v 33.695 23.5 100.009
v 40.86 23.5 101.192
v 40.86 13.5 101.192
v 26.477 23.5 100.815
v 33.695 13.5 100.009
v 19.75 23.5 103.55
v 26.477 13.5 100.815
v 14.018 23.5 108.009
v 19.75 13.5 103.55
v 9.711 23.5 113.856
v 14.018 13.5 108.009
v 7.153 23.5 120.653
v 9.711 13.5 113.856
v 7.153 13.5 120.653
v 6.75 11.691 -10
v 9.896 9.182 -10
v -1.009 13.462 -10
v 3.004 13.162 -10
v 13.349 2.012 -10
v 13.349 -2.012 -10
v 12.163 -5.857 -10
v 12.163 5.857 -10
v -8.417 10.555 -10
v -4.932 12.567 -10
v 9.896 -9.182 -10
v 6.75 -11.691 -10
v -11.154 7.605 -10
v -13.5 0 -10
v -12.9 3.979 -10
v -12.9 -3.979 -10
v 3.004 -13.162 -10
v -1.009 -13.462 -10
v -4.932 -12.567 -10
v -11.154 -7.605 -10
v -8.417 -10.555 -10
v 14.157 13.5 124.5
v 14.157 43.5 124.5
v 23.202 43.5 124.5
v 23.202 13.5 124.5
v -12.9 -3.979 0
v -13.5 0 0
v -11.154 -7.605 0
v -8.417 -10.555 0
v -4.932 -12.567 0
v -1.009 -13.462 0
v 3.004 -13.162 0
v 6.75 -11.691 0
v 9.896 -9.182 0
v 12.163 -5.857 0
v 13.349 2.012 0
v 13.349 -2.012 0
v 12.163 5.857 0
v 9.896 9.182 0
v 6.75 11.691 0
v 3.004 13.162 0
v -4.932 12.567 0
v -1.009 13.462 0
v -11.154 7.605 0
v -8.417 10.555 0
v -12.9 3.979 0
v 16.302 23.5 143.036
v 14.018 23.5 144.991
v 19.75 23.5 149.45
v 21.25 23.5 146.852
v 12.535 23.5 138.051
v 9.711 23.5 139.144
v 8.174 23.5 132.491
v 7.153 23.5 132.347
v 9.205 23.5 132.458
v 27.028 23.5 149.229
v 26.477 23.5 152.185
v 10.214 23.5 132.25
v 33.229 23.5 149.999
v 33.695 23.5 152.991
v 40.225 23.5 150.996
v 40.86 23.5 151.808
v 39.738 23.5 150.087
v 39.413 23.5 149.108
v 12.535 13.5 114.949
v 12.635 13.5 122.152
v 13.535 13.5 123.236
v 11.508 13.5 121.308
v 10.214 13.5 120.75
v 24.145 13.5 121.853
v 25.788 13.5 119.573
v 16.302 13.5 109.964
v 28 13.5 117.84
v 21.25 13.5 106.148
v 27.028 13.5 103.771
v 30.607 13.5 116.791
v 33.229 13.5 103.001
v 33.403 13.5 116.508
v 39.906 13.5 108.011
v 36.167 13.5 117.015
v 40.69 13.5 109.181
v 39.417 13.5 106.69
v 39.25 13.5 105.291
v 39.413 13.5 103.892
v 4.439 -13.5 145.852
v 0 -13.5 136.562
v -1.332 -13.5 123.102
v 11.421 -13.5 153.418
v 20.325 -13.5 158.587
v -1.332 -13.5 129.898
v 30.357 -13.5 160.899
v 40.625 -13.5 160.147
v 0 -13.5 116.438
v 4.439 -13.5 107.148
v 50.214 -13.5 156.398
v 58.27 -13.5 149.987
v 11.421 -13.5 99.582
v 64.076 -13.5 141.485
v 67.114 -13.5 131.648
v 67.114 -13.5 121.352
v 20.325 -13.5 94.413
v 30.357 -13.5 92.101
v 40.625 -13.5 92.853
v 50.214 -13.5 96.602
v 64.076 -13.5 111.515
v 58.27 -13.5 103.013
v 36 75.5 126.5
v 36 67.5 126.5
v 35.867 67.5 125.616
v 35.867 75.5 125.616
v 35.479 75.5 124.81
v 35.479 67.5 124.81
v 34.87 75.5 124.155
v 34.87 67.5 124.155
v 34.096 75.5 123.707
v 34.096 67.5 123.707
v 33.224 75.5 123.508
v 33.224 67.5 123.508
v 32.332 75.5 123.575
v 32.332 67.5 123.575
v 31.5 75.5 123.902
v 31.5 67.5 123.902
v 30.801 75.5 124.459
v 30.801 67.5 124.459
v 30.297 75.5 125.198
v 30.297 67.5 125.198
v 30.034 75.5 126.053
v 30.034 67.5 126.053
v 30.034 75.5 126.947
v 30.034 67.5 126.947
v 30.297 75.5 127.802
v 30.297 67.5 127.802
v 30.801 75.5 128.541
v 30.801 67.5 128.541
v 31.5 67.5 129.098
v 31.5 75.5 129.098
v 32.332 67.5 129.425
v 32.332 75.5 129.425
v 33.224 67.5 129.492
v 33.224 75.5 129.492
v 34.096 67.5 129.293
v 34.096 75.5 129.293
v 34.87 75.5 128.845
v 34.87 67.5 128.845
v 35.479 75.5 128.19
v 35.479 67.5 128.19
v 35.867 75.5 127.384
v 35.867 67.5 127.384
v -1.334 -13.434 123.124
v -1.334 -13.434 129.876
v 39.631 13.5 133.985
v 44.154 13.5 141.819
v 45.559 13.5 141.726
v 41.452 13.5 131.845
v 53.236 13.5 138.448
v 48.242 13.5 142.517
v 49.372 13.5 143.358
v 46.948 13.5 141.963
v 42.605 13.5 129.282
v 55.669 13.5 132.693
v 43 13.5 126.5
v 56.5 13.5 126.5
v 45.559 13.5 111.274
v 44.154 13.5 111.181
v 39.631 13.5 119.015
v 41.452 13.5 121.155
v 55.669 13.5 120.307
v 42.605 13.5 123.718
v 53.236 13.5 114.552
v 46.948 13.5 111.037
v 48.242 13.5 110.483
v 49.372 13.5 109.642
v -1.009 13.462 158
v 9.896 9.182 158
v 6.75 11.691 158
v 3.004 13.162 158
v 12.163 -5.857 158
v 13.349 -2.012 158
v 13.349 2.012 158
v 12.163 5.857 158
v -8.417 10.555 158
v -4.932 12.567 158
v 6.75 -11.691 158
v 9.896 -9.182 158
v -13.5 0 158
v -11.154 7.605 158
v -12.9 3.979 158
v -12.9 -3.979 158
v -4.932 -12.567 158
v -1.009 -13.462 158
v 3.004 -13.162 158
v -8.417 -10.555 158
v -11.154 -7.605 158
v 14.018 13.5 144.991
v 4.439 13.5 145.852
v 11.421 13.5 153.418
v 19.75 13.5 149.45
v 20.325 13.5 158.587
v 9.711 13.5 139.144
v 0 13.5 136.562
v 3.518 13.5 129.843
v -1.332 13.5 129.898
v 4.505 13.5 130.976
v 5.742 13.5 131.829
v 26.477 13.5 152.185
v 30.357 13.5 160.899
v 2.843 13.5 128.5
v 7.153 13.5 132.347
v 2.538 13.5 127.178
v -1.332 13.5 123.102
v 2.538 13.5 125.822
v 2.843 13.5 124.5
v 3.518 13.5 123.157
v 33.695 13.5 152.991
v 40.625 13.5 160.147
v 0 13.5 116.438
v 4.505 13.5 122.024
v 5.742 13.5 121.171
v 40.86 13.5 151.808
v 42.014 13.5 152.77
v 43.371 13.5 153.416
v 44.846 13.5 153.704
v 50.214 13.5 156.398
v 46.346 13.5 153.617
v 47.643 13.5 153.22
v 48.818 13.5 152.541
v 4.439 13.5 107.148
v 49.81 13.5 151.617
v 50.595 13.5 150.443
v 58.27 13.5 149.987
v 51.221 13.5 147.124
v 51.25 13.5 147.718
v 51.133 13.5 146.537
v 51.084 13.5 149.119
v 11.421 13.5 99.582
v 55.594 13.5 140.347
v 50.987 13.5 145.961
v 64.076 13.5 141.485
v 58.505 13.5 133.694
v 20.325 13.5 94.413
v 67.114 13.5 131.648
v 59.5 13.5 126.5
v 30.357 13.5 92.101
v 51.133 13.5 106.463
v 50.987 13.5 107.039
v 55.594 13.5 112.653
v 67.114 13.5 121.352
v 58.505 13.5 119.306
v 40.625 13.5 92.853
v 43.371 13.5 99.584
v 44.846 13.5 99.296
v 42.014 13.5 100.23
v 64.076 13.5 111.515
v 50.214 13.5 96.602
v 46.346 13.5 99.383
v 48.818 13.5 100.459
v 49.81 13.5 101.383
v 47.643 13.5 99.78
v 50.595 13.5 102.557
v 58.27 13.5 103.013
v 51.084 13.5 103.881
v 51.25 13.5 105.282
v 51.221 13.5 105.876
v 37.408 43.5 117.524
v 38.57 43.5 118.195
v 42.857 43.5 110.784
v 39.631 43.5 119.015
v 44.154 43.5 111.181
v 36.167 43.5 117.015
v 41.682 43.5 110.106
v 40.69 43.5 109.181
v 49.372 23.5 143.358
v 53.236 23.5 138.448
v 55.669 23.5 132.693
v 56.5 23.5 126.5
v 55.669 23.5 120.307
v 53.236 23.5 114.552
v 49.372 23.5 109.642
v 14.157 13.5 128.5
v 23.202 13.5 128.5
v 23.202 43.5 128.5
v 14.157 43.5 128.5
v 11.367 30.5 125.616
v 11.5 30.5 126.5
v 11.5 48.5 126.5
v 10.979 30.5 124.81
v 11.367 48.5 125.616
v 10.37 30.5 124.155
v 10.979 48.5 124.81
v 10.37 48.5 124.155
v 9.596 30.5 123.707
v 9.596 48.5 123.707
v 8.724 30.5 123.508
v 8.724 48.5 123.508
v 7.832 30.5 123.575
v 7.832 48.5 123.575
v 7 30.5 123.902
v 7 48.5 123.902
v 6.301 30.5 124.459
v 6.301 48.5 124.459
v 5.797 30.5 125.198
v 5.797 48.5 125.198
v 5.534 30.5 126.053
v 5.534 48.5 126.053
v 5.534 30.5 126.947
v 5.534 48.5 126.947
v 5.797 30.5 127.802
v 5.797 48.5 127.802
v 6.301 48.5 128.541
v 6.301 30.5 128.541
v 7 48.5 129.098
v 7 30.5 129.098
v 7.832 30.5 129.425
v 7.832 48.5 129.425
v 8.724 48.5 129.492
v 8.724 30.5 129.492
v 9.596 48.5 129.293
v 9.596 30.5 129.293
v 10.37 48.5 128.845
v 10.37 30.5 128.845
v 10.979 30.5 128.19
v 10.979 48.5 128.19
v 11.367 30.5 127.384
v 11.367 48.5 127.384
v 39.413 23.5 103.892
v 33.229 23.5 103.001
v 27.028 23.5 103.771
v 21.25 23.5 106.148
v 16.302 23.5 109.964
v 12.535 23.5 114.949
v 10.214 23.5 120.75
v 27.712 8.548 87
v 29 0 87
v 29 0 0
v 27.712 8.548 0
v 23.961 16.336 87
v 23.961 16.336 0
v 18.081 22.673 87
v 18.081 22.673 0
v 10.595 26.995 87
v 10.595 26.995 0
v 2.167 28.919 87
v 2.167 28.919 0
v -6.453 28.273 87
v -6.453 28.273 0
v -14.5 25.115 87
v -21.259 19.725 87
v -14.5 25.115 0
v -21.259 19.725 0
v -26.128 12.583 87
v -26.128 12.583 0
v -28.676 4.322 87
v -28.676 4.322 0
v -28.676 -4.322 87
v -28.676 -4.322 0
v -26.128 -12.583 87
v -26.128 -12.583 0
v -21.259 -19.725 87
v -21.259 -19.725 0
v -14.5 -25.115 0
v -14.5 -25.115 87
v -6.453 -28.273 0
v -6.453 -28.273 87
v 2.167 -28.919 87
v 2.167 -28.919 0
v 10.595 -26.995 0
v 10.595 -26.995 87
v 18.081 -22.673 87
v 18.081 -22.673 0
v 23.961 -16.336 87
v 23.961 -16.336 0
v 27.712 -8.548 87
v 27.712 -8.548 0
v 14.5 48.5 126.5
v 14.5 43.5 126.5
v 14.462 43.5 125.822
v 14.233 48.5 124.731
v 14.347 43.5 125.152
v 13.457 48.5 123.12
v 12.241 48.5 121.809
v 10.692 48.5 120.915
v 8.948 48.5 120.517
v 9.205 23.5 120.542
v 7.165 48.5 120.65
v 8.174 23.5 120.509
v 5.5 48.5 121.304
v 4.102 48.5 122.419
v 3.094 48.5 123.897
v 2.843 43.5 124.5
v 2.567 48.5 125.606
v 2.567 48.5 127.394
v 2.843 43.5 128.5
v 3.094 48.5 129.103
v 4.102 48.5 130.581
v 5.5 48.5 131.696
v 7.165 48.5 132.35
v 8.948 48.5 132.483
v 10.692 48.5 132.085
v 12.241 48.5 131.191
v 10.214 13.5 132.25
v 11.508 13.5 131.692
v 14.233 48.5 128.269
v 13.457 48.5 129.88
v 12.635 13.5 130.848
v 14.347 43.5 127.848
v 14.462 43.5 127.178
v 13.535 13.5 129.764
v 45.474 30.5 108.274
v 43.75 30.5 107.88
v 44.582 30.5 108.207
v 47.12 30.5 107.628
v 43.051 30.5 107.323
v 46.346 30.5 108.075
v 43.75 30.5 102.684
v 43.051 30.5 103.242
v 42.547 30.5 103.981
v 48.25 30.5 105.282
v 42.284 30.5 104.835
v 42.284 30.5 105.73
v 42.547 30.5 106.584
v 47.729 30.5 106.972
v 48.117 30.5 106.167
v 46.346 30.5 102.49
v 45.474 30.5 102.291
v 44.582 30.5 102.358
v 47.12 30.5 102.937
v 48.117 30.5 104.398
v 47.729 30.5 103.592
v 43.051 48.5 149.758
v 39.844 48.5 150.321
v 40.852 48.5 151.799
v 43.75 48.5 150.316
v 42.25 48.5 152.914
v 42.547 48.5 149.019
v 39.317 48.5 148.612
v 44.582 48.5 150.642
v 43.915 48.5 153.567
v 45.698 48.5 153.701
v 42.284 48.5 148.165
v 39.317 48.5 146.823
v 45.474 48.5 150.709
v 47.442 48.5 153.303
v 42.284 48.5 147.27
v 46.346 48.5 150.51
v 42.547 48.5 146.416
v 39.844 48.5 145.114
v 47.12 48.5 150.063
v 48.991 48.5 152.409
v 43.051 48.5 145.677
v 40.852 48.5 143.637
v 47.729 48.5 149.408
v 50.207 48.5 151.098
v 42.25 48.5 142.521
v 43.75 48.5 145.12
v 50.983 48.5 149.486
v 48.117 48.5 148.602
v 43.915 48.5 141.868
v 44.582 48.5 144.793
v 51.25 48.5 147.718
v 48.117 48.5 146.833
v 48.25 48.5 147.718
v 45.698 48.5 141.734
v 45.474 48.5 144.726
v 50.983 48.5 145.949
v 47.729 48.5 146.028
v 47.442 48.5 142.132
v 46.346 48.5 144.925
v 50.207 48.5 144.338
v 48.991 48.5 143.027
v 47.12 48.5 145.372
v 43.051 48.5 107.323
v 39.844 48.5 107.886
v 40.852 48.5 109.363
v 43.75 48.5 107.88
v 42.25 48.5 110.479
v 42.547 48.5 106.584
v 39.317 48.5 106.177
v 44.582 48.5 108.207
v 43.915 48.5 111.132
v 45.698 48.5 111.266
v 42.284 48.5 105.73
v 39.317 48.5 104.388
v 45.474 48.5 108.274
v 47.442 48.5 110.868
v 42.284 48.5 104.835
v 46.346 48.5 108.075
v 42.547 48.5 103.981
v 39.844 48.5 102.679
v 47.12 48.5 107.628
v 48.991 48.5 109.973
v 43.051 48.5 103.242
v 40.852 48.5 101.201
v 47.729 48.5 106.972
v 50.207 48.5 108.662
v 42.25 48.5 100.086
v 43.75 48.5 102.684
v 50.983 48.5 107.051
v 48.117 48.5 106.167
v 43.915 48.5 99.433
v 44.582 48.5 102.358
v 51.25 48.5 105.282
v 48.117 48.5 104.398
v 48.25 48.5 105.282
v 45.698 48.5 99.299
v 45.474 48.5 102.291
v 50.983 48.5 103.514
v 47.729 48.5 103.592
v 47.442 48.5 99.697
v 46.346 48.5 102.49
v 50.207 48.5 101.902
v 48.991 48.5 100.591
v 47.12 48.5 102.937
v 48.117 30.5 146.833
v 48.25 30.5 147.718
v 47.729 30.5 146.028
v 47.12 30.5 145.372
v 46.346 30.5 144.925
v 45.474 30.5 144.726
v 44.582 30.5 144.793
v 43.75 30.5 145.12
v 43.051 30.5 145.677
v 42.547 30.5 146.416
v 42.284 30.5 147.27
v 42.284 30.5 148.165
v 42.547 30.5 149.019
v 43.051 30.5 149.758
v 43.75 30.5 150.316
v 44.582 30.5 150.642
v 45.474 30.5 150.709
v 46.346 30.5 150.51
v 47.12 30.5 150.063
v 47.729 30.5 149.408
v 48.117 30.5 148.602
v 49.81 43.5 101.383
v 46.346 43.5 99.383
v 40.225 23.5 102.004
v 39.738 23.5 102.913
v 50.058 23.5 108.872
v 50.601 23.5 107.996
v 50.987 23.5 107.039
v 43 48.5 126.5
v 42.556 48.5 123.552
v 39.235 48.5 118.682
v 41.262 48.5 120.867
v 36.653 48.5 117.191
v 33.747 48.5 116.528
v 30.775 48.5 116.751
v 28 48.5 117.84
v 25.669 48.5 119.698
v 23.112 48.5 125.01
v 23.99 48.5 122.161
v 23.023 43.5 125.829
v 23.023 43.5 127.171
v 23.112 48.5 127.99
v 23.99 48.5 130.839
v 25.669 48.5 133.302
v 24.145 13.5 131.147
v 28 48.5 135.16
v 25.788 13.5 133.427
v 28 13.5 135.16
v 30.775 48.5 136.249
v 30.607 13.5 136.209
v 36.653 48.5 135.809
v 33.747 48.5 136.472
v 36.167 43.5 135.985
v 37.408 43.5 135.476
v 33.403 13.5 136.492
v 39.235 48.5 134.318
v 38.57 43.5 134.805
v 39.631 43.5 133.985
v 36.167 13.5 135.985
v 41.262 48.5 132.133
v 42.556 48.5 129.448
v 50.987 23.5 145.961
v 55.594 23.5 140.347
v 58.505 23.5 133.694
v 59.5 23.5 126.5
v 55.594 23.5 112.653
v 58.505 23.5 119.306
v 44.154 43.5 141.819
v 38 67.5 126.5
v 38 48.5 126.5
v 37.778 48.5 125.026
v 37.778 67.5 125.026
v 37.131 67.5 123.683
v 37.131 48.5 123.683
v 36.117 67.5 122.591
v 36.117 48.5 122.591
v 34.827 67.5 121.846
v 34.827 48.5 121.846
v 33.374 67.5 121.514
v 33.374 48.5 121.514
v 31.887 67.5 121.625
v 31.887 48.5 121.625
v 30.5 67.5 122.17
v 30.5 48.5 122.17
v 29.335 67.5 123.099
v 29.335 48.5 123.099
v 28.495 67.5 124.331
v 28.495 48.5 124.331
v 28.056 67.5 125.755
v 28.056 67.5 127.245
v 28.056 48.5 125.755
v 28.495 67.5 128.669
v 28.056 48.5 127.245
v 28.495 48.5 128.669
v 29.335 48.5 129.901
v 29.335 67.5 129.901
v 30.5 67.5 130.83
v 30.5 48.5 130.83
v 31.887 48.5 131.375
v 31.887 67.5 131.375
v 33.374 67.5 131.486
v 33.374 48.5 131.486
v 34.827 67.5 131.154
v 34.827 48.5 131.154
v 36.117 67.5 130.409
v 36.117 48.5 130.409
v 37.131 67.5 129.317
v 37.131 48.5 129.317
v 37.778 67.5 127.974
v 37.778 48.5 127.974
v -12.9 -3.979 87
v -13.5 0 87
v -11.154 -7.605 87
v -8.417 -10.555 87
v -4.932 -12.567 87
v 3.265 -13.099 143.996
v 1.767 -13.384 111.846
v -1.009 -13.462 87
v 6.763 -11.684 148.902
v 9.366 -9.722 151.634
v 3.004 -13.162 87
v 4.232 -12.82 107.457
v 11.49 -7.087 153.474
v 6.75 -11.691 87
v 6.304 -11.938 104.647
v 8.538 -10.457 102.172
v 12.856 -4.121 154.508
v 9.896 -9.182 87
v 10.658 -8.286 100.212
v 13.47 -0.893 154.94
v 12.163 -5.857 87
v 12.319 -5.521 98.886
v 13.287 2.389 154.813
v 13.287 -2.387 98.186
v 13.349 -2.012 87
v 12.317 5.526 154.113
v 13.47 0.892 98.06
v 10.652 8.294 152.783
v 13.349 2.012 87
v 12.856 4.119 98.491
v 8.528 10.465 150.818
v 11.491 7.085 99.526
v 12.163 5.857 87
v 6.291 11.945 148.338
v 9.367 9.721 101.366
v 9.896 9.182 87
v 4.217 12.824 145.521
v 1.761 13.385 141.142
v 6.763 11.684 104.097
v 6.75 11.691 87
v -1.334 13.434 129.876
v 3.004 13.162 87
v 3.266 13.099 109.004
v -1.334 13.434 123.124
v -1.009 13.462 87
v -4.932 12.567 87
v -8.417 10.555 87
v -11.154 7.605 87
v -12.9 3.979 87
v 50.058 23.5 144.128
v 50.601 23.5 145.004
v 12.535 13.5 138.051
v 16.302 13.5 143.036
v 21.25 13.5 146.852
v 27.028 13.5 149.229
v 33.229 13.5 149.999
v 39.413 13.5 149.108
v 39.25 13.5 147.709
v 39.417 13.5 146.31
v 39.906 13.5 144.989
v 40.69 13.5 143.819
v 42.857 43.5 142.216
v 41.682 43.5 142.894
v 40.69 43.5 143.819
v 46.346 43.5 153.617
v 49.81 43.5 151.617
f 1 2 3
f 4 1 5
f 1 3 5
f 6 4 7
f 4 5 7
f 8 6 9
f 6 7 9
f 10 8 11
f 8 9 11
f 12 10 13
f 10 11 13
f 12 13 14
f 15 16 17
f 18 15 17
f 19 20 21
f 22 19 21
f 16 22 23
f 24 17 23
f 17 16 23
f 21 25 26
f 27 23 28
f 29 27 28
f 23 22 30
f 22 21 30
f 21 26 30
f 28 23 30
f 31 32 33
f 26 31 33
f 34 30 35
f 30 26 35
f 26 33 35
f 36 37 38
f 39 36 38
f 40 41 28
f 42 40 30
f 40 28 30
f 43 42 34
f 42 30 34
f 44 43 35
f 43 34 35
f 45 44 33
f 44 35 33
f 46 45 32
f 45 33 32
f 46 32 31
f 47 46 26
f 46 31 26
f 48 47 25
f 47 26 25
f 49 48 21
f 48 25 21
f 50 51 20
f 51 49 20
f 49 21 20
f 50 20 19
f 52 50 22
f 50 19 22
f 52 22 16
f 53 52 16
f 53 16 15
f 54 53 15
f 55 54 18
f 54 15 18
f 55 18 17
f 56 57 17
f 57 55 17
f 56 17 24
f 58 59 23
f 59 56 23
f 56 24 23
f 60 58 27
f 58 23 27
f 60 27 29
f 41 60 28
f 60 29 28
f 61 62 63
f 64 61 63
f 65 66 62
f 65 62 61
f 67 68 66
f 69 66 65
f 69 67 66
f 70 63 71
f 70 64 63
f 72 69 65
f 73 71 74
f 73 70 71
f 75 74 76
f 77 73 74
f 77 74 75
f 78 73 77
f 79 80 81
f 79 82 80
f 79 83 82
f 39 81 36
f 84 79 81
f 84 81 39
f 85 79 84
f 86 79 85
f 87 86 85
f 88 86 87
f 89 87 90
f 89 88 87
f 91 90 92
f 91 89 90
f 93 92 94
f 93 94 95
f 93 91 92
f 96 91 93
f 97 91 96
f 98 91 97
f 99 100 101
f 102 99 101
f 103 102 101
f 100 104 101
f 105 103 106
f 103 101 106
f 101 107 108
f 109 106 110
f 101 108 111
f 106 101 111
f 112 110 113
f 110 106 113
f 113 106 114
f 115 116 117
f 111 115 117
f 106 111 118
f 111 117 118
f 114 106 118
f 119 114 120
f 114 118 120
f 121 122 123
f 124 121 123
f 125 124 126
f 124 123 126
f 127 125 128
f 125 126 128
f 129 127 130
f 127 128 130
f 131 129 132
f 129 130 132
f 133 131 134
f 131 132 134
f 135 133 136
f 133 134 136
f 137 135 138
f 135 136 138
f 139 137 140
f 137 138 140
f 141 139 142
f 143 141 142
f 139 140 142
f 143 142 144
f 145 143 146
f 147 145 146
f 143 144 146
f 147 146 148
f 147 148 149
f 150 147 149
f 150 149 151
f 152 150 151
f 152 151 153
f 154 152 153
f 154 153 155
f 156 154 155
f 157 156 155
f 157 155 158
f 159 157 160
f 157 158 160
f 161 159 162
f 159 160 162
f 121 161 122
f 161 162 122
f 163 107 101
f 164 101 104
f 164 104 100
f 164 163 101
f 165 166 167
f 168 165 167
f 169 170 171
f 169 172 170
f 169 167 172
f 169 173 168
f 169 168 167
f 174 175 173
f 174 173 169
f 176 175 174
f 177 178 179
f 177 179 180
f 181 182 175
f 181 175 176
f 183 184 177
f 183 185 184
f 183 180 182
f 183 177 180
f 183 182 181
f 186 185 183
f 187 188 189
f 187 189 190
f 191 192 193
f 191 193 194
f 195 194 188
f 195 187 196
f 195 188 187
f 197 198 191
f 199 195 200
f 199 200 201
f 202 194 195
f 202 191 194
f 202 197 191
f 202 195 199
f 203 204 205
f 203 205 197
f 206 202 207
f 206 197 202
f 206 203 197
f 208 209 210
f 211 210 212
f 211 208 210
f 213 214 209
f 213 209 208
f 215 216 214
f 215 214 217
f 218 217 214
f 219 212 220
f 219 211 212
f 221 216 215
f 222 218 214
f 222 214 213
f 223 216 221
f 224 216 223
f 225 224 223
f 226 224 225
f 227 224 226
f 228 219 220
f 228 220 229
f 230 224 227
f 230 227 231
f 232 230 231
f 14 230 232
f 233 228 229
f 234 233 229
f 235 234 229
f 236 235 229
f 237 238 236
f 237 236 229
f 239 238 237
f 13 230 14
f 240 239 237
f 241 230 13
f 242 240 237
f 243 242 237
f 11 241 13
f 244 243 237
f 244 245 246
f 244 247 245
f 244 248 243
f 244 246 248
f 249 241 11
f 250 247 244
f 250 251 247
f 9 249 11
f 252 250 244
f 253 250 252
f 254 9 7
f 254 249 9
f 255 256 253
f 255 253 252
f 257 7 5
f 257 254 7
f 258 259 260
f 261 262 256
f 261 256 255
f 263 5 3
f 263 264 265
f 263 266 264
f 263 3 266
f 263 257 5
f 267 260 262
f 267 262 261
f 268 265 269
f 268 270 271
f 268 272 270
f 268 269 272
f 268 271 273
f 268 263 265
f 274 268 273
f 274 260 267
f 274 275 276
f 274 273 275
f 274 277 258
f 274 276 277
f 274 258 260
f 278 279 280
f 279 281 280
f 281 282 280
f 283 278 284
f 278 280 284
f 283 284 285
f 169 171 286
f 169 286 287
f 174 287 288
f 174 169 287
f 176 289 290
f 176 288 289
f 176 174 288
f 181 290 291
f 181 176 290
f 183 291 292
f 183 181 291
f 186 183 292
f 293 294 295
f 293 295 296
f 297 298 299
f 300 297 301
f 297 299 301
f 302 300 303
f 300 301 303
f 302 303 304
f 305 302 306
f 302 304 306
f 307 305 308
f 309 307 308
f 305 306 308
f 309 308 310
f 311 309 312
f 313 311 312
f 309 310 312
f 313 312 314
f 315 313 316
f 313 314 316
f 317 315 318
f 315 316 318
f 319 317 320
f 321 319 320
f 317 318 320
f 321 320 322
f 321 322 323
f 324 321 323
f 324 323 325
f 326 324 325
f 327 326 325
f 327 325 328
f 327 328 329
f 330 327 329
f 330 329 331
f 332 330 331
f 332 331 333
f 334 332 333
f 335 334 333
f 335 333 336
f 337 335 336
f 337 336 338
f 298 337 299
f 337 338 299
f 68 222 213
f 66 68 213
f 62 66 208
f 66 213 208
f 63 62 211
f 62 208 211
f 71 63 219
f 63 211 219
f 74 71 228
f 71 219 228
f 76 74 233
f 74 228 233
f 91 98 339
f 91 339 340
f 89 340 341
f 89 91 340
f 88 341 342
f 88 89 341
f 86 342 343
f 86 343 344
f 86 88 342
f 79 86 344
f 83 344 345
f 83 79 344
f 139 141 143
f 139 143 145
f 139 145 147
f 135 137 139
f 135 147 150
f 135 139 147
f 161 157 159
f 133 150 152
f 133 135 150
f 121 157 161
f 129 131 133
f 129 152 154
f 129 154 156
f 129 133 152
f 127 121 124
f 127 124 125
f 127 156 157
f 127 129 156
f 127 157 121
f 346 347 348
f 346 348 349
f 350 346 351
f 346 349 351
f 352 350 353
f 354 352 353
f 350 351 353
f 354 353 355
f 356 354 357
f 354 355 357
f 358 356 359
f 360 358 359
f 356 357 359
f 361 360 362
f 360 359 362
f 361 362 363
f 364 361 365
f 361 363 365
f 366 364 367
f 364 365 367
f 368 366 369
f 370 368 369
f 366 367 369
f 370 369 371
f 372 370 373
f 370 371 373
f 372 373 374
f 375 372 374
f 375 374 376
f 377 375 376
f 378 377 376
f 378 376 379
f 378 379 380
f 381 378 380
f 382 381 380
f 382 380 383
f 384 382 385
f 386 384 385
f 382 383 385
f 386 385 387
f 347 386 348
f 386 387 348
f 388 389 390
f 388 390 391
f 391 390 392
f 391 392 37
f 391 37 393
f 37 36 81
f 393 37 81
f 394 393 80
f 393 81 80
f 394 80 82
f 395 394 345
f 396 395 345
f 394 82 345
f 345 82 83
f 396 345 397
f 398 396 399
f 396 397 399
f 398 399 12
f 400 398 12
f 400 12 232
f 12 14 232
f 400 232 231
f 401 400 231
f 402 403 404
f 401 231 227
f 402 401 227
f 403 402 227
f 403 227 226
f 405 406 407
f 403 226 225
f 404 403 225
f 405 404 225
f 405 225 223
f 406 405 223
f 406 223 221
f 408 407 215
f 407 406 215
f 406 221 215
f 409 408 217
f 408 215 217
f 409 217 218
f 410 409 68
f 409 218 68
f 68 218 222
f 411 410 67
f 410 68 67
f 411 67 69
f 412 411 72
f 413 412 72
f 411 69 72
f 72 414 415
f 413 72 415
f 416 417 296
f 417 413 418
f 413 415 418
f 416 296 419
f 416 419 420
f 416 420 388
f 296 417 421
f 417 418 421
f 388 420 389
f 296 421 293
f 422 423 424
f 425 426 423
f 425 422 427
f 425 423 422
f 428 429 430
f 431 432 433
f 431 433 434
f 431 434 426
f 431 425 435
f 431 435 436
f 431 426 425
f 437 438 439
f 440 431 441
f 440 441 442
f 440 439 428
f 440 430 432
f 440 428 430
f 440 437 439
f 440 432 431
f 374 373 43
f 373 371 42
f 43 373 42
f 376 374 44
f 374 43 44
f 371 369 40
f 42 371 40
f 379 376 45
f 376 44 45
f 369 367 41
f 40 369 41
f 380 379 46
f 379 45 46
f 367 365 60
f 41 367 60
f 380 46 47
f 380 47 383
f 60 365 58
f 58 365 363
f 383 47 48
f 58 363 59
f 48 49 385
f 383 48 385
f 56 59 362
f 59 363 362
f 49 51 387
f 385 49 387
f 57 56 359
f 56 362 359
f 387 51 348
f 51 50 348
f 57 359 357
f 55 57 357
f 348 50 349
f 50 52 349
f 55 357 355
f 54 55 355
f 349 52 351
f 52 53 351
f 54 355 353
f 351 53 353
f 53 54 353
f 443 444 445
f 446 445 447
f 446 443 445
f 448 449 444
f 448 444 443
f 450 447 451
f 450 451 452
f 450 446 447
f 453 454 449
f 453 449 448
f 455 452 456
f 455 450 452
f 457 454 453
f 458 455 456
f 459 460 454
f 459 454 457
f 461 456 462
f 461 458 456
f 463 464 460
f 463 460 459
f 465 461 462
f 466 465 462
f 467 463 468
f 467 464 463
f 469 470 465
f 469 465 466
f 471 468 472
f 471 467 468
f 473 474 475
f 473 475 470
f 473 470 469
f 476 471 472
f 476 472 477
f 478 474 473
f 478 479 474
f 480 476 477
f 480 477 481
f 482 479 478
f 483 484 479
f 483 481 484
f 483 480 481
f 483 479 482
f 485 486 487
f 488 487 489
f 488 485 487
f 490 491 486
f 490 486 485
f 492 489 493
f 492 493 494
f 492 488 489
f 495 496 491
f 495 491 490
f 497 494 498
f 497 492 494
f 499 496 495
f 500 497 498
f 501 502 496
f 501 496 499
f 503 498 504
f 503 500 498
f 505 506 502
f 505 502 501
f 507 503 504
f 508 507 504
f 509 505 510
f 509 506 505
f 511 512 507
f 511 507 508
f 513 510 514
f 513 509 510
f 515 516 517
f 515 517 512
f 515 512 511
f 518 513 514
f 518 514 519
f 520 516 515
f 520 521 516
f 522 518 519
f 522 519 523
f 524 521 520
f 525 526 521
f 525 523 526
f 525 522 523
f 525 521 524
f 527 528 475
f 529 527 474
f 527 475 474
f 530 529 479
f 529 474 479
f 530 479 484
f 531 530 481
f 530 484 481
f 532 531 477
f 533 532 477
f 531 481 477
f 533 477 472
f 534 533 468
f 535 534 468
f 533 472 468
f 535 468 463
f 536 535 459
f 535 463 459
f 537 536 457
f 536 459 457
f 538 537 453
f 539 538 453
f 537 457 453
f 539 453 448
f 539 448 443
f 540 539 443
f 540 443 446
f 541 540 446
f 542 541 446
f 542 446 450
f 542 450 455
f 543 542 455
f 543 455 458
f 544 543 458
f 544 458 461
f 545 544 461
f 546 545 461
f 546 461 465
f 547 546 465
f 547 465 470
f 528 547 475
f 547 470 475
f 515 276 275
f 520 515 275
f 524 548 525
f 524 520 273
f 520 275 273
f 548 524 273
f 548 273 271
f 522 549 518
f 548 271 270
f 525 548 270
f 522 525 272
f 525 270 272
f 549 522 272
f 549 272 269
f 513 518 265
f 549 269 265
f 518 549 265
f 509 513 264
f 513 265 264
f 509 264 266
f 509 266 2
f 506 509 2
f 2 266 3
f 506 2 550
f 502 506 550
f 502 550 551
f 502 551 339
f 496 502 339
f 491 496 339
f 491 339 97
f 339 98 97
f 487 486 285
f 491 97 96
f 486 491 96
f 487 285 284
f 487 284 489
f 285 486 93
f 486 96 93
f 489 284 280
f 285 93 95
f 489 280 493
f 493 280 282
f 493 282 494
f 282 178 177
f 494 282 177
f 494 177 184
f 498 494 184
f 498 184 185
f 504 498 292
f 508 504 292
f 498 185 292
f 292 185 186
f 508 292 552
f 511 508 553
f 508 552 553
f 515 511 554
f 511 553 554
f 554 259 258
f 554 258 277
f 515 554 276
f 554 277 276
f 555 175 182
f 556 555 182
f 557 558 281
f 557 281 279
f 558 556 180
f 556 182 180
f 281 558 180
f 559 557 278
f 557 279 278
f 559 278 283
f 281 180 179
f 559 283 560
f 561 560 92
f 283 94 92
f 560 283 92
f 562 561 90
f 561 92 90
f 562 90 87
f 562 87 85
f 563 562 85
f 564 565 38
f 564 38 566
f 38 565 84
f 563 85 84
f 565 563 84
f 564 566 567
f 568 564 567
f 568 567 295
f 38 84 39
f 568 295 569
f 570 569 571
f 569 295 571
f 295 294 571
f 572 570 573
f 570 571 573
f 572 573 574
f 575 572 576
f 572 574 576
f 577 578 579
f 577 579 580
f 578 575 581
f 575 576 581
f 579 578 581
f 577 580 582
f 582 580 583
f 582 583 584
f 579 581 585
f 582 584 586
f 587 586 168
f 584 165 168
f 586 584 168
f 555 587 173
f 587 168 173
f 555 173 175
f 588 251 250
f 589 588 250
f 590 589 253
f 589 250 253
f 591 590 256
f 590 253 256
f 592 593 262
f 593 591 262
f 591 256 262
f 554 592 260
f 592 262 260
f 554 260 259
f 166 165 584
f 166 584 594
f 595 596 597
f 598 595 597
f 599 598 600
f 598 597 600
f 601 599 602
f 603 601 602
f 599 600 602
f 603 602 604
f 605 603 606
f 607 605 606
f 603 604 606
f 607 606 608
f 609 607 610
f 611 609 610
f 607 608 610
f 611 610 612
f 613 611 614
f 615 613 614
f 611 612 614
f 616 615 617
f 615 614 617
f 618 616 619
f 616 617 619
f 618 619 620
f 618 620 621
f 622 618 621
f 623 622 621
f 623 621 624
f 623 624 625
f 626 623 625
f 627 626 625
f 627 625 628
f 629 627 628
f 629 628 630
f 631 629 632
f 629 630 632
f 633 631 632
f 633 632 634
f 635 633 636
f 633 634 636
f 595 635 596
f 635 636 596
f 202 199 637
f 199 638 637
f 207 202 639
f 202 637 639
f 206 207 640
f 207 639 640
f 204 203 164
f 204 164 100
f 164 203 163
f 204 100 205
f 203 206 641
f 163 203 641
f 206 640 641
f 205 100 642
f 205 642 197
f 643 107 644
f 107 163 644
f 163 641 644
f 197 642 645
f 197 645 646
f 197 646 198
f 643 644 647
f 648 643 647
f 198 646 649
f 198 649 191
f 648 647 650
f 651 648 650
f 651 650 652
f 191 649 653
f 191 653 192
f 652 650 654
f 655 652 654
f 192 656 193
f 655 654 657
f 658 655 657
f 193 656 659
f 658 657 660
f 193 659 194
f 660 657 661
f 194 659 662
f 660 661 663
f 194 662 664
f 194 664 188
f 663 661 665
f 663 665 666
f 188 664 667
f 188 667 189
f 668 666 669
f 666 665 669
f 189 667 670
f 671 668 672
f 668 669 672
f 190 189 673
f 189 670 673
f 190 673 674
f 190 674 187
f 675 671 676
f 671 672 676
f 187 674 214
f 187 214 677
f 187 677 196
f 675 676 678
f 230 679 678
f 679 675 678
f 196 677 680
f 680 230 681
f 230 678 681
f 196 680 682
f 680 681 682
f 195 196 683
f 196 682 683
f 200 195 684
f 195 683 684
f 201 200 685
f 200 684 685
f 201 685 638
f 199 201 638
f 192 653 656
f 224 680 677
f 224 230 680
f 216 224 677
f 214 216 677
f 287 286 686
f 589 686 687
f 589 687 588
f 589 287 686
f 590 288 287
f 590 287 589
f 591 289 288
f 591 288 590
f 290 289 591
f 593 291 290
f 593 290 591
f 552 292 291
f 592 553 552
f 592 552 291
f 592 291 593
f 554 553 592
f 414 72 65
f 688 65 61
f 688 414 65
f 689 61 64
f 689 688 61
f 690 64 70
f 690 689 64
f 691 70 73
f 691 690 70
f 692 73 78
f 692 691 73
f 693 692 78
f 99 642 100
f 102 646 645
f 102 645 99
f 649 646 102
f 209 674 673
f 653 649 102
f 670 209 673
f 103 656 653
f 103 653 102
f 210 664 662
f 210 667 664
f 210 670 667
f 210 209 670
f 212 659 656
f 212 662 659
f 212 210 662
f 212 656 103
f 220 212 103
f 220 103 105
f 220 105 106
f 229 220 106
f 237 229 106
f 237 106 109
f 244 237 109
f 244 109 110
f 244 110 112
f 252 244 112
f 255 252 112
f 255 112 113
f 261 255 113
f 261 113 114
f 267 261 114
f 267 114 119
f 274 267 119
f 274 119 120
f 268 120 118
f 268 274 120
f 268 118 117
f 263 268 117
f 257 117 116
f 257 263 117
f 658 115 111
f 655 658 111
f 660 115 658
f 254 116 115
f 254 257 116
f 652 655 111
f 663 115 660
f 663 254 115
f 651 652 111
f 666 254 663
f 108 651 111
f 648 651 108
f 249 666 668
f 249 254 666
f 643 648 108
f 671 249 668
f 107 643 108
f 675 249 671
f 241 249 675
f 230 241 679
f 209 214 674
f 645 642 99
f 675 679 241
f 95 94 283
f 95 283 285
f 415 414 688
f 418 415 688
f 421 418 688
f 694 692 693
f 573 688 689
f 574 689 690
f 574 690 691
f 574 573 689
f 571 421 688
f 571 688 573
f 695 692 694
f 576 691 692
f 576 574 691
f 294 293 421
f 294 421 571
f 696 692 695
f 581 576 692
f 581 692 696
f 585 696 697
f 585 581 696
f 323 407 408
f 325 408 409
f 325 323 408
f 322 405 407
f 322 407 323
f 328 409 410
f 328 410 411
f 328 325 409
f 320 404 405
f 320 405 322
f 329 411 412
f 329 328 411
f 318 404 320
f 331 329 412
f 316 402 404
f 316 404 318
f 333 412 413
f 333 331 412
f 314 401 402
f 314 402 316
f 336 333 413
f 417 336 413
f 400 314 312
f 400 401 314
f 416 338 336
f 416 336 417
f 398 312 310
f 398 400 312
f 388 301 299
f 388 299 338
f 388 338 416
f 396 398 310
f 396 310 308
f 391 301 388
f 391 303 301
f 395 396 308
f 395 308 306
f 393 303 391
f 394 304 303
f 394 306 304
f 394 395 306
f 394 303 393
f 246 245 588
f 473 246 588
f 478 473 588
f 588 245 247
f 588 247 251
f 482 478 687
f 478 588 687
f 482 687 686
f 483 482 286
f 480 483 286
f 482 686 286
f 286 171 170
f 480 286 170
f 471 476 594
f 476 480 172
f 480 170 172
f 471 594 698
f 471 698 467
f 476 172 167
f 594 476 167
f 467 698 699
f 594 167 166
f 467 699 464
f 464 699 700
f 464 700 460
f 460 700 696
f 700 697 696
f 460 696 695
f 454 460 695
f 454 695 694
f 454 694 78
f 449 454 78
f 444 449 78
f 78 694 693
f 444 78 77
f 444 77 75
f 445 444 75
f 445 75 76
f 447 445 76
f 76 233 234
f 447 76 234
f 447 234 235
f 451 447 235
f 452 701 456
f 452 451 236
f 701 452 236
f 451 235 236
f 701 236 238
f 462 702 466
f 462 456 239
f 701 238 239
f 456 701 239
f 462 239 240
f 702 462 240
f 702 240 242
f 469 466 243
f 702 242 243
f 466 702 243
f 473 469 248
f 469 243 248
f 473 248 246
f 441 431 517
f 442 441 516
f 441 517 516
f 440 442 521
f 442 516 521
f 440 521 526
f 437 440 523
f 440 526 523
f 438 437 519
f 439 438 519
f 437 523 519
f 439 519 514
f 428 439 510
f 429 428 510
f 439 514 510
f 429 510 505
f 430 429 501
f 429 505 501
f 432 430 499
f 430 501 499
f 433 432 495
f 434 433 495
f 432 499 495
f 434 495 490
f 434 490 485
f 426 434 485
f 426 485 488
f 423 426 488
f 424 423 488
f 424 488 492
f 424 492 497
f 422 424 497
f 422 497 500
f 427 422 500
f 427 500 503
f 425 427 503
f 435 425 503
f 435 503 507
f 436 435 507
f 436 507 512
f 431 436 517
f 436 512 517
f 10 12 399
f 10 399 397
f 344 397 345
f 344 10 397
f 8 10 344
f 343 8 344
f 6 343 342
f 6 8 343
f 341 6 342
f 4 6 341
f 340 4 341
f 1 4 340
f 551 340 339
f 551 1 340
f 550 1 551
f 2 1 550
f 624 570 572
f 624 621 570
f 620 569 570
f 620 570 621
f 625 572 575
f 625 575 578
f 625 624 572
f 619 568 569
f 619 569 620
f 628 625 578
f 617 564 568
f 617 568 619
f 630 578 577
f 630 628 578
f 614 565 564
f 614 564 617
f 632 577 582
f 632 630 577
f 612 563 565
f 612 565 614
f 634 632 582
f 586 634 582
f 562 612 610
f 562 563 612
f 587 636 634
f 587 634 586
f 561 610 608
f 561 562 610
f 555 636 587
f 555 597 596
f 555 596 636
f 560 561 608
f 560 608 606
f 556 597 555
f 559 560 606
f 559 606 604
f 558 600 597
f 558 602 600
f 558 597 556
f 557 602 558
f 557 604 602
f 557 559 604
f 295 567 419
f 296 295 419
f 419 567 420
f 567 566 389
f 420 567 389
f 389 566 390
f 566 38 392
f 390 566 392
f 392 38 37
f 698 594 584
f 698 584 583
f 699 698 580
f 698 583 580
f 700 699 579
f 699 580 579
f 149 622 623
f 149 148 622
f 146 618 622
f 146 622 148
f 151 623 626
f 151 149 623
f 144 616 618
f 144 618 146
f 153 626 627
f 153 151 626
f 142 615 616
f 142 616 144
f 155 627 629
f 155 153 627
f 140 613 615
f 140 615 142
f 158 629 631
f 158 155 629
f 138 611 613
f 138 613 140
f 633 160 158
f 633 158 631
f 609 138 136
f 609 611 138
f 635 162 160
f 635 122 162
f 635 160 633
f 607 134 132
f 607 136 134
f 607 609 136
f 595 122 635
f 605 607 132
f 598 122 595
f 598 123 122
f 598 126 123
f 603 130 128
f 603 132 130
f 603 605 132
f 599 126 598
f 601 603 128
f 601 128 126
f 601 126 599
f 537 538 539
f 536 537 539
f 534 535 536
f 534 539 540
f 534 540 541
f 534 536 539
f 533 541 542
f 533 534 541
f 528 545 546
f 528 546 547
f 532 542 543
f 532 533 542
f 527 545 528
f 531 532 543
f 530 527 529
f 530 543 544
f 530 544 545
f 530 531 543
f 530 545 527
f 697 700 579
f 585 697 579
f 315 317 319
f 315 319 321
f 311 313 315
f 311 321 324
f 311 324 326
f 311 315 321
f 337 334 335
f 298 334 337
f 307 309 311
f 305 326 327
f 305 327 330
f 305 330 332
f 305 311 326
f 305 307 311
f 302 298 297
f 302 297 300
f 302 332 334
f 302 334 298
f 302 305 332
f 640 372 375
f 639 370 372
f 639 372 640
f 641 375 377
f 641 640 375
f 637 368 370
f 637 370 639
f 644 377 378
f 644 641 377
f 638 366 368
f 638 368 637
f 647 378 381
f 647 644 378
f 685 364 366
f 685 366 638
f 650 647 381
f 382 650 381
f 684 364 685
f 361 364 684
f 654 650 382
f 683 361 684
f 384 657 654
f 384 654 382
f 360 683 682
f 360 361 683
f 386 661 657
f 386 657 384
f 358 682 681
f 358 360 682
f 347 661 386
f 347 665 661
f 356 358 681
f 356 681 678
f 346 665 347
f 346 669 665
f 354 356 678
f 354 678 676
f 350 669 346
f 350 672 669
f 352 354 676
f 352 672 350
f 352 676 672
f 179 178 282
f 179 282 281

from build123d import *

# Parameters (mm, degrees)
SKETCH1_R           = 29
BOSS_EXTRUDE1_DEPTH = 87
SKETCH3_W           = 13.5
SKETCH3_H           = 168
SKETCH4_R           = 34.5
BOSS_EXTRUDE2_DEPTH = 13.5
SKETCH5_R           = 6
SKETCH5_R_2         = 10
BOSS_EXTRUDE3_DEPTH = 35
BOSS_EXTRUDE4_DEPTH = 30
SKETCH7_R           = 26.5
SKETCH7_R_2         = 23.5
BOSS_EXTRUDE5_DEPTH = 10
SKETCH8_R           = 3
CUT_EXTRUDE1_DEPTH  = 18
SKETCH9_R           = 5
BOSS_EXTRUDE6_DEPTH = 19
SKETCH10_R          = 3
BOSS_EXTRUDE7_DEPTH = 8


with BuildPart() as part:
    # Sketch1 → Boss-Extrude1 (new body)
    with BuildSketch(Plane.XY):
        Circle(SKETCH1_R)
    extrude(amount=BOSS_EXTRUDE1_DEPTH)

    # Sketch3 → Revolve1 (revolve)
    with BuildSketch(Plane(origin=(0, 0, 0), x_dir=(1, 0, 0), z_dir=(0, 1, 0))):
        with Locations((-6.75, -74)):
            Rectangle(SKETCH3_W, SKETCH3_H)
    revolve(axis=Axis((0, 0, 0), (0, 0, 1)))

    # Sketch4 → Boss-Extrude2 (add, symmetric)
    with BuildSketch(Plane(origin=(0, 0, 0), x_dir=(1, 0, 0), z_dir=(0, 1, 0))):
        with Locations((33, -126.5)):
            Circle(SKETCH4_R)
    extrude(amount=BOSS_EXTRUDE2_DEPTH, both=True)

    # Sketch5 → Boss-Extrude3 (add)
    with BuildSketch(Plane(origin=(0, 13.5, 0), x_dir=(1, 0, 0), z_dir=(0, 1, 0))):
        with Locations((8.5, -126.5)):
            Circle(SKETCH5_R)
        with Locations((33, -126.5)):
            Circle(SKETCH5_R_2)
        with Locations((45.25, -105.282377607)):
            Circle(SKETCH5_R)
        with Locations((45.25, -147.717622393)):
            Circle(SKETCH5_R)
    extrude(amount=BOSS_EXTRUDE3_DEPTH)

    # Sketch6 → Boss-Extrude4 (add)
    with BuildSketch(Plane(origin=(0, 13.5, 0), x_dir=(1, 0, 0), z_dir=(0, 1, 0))):
        Polygon((31.845299462, -128.5), (2.843145751, -128.5), (2.843145751, -124.5), (31.845299462, -124.5), (46.346376317, -99.383398122), (49.810477932, -101.383398122), (36.0121545, -125.282795366), (36.116305102, -127.897598768), (49.810477932, -151.616601878), (46.346376317, -153.616601878), align=None)
    extrude(amount=BOSS_EXTRUDE4_DEPTH)

    # Sketch7 → Boss-Extrude5 (add)
    with BuildSketch(Plane(origin=(0, 13.5, 0), x_dir=(1, 0, 0), z_dir=(0, 1, 0))):
        with Locations((33, -126.5)):
            Circle(SKETCH7_R)
        with Locations((33, -126.5)):
            Circle(SKETCH7_R_2, mode=Mode.SUBTRACT)
    extrude(amount=BOSS_EXTRUDE5_DEPTH)

    # Sketch8 → Cut-Extrude1 (cut)
    with BuildSketch(Plane(origin=(0, 48.5, 0), x_dir=(1, 0, 0), z_dir=(0, 1, 0))):
        with Locations((8.5, -126.5)):
            Circle(SKETCH8_R)
        with Locations((45.25, -105.282377607)):
            Circle(SKETCH8_R)
        with Locations((45.25, -147.717622393)):
            Circle(SKETCH8_R)
    extrude(amount=-CUT_EXTRUDE1_DEPTH, mode=Mode.SUBTRACT)

    # Sketch9 → Boss-Extrude6 (add)
    with BuildSketch(Plane(origin=(0, 48.5, 0), x_dir=(1, 0, 0), z_dir=(0, 1, 0))):
        with Locations((33, -126.5)):
            Circle(SKETCH9_R)
    extrude(amount=BOSS_EXTRUDE6_DEPTH)

    # Sketch10 → Boss-Extrude7 (add)
    with BuildSketch(Plane(origin=(0, 67.5, 0), x_dir=(1, 0, 0), z_dir=(0, 1, 0))):
        with Locations((33, -126.5)):
            Circle(SKETCH10_R)
    extrude(amount=BOSS_EXTRUDE7_DEPTH)


solid = part.part
